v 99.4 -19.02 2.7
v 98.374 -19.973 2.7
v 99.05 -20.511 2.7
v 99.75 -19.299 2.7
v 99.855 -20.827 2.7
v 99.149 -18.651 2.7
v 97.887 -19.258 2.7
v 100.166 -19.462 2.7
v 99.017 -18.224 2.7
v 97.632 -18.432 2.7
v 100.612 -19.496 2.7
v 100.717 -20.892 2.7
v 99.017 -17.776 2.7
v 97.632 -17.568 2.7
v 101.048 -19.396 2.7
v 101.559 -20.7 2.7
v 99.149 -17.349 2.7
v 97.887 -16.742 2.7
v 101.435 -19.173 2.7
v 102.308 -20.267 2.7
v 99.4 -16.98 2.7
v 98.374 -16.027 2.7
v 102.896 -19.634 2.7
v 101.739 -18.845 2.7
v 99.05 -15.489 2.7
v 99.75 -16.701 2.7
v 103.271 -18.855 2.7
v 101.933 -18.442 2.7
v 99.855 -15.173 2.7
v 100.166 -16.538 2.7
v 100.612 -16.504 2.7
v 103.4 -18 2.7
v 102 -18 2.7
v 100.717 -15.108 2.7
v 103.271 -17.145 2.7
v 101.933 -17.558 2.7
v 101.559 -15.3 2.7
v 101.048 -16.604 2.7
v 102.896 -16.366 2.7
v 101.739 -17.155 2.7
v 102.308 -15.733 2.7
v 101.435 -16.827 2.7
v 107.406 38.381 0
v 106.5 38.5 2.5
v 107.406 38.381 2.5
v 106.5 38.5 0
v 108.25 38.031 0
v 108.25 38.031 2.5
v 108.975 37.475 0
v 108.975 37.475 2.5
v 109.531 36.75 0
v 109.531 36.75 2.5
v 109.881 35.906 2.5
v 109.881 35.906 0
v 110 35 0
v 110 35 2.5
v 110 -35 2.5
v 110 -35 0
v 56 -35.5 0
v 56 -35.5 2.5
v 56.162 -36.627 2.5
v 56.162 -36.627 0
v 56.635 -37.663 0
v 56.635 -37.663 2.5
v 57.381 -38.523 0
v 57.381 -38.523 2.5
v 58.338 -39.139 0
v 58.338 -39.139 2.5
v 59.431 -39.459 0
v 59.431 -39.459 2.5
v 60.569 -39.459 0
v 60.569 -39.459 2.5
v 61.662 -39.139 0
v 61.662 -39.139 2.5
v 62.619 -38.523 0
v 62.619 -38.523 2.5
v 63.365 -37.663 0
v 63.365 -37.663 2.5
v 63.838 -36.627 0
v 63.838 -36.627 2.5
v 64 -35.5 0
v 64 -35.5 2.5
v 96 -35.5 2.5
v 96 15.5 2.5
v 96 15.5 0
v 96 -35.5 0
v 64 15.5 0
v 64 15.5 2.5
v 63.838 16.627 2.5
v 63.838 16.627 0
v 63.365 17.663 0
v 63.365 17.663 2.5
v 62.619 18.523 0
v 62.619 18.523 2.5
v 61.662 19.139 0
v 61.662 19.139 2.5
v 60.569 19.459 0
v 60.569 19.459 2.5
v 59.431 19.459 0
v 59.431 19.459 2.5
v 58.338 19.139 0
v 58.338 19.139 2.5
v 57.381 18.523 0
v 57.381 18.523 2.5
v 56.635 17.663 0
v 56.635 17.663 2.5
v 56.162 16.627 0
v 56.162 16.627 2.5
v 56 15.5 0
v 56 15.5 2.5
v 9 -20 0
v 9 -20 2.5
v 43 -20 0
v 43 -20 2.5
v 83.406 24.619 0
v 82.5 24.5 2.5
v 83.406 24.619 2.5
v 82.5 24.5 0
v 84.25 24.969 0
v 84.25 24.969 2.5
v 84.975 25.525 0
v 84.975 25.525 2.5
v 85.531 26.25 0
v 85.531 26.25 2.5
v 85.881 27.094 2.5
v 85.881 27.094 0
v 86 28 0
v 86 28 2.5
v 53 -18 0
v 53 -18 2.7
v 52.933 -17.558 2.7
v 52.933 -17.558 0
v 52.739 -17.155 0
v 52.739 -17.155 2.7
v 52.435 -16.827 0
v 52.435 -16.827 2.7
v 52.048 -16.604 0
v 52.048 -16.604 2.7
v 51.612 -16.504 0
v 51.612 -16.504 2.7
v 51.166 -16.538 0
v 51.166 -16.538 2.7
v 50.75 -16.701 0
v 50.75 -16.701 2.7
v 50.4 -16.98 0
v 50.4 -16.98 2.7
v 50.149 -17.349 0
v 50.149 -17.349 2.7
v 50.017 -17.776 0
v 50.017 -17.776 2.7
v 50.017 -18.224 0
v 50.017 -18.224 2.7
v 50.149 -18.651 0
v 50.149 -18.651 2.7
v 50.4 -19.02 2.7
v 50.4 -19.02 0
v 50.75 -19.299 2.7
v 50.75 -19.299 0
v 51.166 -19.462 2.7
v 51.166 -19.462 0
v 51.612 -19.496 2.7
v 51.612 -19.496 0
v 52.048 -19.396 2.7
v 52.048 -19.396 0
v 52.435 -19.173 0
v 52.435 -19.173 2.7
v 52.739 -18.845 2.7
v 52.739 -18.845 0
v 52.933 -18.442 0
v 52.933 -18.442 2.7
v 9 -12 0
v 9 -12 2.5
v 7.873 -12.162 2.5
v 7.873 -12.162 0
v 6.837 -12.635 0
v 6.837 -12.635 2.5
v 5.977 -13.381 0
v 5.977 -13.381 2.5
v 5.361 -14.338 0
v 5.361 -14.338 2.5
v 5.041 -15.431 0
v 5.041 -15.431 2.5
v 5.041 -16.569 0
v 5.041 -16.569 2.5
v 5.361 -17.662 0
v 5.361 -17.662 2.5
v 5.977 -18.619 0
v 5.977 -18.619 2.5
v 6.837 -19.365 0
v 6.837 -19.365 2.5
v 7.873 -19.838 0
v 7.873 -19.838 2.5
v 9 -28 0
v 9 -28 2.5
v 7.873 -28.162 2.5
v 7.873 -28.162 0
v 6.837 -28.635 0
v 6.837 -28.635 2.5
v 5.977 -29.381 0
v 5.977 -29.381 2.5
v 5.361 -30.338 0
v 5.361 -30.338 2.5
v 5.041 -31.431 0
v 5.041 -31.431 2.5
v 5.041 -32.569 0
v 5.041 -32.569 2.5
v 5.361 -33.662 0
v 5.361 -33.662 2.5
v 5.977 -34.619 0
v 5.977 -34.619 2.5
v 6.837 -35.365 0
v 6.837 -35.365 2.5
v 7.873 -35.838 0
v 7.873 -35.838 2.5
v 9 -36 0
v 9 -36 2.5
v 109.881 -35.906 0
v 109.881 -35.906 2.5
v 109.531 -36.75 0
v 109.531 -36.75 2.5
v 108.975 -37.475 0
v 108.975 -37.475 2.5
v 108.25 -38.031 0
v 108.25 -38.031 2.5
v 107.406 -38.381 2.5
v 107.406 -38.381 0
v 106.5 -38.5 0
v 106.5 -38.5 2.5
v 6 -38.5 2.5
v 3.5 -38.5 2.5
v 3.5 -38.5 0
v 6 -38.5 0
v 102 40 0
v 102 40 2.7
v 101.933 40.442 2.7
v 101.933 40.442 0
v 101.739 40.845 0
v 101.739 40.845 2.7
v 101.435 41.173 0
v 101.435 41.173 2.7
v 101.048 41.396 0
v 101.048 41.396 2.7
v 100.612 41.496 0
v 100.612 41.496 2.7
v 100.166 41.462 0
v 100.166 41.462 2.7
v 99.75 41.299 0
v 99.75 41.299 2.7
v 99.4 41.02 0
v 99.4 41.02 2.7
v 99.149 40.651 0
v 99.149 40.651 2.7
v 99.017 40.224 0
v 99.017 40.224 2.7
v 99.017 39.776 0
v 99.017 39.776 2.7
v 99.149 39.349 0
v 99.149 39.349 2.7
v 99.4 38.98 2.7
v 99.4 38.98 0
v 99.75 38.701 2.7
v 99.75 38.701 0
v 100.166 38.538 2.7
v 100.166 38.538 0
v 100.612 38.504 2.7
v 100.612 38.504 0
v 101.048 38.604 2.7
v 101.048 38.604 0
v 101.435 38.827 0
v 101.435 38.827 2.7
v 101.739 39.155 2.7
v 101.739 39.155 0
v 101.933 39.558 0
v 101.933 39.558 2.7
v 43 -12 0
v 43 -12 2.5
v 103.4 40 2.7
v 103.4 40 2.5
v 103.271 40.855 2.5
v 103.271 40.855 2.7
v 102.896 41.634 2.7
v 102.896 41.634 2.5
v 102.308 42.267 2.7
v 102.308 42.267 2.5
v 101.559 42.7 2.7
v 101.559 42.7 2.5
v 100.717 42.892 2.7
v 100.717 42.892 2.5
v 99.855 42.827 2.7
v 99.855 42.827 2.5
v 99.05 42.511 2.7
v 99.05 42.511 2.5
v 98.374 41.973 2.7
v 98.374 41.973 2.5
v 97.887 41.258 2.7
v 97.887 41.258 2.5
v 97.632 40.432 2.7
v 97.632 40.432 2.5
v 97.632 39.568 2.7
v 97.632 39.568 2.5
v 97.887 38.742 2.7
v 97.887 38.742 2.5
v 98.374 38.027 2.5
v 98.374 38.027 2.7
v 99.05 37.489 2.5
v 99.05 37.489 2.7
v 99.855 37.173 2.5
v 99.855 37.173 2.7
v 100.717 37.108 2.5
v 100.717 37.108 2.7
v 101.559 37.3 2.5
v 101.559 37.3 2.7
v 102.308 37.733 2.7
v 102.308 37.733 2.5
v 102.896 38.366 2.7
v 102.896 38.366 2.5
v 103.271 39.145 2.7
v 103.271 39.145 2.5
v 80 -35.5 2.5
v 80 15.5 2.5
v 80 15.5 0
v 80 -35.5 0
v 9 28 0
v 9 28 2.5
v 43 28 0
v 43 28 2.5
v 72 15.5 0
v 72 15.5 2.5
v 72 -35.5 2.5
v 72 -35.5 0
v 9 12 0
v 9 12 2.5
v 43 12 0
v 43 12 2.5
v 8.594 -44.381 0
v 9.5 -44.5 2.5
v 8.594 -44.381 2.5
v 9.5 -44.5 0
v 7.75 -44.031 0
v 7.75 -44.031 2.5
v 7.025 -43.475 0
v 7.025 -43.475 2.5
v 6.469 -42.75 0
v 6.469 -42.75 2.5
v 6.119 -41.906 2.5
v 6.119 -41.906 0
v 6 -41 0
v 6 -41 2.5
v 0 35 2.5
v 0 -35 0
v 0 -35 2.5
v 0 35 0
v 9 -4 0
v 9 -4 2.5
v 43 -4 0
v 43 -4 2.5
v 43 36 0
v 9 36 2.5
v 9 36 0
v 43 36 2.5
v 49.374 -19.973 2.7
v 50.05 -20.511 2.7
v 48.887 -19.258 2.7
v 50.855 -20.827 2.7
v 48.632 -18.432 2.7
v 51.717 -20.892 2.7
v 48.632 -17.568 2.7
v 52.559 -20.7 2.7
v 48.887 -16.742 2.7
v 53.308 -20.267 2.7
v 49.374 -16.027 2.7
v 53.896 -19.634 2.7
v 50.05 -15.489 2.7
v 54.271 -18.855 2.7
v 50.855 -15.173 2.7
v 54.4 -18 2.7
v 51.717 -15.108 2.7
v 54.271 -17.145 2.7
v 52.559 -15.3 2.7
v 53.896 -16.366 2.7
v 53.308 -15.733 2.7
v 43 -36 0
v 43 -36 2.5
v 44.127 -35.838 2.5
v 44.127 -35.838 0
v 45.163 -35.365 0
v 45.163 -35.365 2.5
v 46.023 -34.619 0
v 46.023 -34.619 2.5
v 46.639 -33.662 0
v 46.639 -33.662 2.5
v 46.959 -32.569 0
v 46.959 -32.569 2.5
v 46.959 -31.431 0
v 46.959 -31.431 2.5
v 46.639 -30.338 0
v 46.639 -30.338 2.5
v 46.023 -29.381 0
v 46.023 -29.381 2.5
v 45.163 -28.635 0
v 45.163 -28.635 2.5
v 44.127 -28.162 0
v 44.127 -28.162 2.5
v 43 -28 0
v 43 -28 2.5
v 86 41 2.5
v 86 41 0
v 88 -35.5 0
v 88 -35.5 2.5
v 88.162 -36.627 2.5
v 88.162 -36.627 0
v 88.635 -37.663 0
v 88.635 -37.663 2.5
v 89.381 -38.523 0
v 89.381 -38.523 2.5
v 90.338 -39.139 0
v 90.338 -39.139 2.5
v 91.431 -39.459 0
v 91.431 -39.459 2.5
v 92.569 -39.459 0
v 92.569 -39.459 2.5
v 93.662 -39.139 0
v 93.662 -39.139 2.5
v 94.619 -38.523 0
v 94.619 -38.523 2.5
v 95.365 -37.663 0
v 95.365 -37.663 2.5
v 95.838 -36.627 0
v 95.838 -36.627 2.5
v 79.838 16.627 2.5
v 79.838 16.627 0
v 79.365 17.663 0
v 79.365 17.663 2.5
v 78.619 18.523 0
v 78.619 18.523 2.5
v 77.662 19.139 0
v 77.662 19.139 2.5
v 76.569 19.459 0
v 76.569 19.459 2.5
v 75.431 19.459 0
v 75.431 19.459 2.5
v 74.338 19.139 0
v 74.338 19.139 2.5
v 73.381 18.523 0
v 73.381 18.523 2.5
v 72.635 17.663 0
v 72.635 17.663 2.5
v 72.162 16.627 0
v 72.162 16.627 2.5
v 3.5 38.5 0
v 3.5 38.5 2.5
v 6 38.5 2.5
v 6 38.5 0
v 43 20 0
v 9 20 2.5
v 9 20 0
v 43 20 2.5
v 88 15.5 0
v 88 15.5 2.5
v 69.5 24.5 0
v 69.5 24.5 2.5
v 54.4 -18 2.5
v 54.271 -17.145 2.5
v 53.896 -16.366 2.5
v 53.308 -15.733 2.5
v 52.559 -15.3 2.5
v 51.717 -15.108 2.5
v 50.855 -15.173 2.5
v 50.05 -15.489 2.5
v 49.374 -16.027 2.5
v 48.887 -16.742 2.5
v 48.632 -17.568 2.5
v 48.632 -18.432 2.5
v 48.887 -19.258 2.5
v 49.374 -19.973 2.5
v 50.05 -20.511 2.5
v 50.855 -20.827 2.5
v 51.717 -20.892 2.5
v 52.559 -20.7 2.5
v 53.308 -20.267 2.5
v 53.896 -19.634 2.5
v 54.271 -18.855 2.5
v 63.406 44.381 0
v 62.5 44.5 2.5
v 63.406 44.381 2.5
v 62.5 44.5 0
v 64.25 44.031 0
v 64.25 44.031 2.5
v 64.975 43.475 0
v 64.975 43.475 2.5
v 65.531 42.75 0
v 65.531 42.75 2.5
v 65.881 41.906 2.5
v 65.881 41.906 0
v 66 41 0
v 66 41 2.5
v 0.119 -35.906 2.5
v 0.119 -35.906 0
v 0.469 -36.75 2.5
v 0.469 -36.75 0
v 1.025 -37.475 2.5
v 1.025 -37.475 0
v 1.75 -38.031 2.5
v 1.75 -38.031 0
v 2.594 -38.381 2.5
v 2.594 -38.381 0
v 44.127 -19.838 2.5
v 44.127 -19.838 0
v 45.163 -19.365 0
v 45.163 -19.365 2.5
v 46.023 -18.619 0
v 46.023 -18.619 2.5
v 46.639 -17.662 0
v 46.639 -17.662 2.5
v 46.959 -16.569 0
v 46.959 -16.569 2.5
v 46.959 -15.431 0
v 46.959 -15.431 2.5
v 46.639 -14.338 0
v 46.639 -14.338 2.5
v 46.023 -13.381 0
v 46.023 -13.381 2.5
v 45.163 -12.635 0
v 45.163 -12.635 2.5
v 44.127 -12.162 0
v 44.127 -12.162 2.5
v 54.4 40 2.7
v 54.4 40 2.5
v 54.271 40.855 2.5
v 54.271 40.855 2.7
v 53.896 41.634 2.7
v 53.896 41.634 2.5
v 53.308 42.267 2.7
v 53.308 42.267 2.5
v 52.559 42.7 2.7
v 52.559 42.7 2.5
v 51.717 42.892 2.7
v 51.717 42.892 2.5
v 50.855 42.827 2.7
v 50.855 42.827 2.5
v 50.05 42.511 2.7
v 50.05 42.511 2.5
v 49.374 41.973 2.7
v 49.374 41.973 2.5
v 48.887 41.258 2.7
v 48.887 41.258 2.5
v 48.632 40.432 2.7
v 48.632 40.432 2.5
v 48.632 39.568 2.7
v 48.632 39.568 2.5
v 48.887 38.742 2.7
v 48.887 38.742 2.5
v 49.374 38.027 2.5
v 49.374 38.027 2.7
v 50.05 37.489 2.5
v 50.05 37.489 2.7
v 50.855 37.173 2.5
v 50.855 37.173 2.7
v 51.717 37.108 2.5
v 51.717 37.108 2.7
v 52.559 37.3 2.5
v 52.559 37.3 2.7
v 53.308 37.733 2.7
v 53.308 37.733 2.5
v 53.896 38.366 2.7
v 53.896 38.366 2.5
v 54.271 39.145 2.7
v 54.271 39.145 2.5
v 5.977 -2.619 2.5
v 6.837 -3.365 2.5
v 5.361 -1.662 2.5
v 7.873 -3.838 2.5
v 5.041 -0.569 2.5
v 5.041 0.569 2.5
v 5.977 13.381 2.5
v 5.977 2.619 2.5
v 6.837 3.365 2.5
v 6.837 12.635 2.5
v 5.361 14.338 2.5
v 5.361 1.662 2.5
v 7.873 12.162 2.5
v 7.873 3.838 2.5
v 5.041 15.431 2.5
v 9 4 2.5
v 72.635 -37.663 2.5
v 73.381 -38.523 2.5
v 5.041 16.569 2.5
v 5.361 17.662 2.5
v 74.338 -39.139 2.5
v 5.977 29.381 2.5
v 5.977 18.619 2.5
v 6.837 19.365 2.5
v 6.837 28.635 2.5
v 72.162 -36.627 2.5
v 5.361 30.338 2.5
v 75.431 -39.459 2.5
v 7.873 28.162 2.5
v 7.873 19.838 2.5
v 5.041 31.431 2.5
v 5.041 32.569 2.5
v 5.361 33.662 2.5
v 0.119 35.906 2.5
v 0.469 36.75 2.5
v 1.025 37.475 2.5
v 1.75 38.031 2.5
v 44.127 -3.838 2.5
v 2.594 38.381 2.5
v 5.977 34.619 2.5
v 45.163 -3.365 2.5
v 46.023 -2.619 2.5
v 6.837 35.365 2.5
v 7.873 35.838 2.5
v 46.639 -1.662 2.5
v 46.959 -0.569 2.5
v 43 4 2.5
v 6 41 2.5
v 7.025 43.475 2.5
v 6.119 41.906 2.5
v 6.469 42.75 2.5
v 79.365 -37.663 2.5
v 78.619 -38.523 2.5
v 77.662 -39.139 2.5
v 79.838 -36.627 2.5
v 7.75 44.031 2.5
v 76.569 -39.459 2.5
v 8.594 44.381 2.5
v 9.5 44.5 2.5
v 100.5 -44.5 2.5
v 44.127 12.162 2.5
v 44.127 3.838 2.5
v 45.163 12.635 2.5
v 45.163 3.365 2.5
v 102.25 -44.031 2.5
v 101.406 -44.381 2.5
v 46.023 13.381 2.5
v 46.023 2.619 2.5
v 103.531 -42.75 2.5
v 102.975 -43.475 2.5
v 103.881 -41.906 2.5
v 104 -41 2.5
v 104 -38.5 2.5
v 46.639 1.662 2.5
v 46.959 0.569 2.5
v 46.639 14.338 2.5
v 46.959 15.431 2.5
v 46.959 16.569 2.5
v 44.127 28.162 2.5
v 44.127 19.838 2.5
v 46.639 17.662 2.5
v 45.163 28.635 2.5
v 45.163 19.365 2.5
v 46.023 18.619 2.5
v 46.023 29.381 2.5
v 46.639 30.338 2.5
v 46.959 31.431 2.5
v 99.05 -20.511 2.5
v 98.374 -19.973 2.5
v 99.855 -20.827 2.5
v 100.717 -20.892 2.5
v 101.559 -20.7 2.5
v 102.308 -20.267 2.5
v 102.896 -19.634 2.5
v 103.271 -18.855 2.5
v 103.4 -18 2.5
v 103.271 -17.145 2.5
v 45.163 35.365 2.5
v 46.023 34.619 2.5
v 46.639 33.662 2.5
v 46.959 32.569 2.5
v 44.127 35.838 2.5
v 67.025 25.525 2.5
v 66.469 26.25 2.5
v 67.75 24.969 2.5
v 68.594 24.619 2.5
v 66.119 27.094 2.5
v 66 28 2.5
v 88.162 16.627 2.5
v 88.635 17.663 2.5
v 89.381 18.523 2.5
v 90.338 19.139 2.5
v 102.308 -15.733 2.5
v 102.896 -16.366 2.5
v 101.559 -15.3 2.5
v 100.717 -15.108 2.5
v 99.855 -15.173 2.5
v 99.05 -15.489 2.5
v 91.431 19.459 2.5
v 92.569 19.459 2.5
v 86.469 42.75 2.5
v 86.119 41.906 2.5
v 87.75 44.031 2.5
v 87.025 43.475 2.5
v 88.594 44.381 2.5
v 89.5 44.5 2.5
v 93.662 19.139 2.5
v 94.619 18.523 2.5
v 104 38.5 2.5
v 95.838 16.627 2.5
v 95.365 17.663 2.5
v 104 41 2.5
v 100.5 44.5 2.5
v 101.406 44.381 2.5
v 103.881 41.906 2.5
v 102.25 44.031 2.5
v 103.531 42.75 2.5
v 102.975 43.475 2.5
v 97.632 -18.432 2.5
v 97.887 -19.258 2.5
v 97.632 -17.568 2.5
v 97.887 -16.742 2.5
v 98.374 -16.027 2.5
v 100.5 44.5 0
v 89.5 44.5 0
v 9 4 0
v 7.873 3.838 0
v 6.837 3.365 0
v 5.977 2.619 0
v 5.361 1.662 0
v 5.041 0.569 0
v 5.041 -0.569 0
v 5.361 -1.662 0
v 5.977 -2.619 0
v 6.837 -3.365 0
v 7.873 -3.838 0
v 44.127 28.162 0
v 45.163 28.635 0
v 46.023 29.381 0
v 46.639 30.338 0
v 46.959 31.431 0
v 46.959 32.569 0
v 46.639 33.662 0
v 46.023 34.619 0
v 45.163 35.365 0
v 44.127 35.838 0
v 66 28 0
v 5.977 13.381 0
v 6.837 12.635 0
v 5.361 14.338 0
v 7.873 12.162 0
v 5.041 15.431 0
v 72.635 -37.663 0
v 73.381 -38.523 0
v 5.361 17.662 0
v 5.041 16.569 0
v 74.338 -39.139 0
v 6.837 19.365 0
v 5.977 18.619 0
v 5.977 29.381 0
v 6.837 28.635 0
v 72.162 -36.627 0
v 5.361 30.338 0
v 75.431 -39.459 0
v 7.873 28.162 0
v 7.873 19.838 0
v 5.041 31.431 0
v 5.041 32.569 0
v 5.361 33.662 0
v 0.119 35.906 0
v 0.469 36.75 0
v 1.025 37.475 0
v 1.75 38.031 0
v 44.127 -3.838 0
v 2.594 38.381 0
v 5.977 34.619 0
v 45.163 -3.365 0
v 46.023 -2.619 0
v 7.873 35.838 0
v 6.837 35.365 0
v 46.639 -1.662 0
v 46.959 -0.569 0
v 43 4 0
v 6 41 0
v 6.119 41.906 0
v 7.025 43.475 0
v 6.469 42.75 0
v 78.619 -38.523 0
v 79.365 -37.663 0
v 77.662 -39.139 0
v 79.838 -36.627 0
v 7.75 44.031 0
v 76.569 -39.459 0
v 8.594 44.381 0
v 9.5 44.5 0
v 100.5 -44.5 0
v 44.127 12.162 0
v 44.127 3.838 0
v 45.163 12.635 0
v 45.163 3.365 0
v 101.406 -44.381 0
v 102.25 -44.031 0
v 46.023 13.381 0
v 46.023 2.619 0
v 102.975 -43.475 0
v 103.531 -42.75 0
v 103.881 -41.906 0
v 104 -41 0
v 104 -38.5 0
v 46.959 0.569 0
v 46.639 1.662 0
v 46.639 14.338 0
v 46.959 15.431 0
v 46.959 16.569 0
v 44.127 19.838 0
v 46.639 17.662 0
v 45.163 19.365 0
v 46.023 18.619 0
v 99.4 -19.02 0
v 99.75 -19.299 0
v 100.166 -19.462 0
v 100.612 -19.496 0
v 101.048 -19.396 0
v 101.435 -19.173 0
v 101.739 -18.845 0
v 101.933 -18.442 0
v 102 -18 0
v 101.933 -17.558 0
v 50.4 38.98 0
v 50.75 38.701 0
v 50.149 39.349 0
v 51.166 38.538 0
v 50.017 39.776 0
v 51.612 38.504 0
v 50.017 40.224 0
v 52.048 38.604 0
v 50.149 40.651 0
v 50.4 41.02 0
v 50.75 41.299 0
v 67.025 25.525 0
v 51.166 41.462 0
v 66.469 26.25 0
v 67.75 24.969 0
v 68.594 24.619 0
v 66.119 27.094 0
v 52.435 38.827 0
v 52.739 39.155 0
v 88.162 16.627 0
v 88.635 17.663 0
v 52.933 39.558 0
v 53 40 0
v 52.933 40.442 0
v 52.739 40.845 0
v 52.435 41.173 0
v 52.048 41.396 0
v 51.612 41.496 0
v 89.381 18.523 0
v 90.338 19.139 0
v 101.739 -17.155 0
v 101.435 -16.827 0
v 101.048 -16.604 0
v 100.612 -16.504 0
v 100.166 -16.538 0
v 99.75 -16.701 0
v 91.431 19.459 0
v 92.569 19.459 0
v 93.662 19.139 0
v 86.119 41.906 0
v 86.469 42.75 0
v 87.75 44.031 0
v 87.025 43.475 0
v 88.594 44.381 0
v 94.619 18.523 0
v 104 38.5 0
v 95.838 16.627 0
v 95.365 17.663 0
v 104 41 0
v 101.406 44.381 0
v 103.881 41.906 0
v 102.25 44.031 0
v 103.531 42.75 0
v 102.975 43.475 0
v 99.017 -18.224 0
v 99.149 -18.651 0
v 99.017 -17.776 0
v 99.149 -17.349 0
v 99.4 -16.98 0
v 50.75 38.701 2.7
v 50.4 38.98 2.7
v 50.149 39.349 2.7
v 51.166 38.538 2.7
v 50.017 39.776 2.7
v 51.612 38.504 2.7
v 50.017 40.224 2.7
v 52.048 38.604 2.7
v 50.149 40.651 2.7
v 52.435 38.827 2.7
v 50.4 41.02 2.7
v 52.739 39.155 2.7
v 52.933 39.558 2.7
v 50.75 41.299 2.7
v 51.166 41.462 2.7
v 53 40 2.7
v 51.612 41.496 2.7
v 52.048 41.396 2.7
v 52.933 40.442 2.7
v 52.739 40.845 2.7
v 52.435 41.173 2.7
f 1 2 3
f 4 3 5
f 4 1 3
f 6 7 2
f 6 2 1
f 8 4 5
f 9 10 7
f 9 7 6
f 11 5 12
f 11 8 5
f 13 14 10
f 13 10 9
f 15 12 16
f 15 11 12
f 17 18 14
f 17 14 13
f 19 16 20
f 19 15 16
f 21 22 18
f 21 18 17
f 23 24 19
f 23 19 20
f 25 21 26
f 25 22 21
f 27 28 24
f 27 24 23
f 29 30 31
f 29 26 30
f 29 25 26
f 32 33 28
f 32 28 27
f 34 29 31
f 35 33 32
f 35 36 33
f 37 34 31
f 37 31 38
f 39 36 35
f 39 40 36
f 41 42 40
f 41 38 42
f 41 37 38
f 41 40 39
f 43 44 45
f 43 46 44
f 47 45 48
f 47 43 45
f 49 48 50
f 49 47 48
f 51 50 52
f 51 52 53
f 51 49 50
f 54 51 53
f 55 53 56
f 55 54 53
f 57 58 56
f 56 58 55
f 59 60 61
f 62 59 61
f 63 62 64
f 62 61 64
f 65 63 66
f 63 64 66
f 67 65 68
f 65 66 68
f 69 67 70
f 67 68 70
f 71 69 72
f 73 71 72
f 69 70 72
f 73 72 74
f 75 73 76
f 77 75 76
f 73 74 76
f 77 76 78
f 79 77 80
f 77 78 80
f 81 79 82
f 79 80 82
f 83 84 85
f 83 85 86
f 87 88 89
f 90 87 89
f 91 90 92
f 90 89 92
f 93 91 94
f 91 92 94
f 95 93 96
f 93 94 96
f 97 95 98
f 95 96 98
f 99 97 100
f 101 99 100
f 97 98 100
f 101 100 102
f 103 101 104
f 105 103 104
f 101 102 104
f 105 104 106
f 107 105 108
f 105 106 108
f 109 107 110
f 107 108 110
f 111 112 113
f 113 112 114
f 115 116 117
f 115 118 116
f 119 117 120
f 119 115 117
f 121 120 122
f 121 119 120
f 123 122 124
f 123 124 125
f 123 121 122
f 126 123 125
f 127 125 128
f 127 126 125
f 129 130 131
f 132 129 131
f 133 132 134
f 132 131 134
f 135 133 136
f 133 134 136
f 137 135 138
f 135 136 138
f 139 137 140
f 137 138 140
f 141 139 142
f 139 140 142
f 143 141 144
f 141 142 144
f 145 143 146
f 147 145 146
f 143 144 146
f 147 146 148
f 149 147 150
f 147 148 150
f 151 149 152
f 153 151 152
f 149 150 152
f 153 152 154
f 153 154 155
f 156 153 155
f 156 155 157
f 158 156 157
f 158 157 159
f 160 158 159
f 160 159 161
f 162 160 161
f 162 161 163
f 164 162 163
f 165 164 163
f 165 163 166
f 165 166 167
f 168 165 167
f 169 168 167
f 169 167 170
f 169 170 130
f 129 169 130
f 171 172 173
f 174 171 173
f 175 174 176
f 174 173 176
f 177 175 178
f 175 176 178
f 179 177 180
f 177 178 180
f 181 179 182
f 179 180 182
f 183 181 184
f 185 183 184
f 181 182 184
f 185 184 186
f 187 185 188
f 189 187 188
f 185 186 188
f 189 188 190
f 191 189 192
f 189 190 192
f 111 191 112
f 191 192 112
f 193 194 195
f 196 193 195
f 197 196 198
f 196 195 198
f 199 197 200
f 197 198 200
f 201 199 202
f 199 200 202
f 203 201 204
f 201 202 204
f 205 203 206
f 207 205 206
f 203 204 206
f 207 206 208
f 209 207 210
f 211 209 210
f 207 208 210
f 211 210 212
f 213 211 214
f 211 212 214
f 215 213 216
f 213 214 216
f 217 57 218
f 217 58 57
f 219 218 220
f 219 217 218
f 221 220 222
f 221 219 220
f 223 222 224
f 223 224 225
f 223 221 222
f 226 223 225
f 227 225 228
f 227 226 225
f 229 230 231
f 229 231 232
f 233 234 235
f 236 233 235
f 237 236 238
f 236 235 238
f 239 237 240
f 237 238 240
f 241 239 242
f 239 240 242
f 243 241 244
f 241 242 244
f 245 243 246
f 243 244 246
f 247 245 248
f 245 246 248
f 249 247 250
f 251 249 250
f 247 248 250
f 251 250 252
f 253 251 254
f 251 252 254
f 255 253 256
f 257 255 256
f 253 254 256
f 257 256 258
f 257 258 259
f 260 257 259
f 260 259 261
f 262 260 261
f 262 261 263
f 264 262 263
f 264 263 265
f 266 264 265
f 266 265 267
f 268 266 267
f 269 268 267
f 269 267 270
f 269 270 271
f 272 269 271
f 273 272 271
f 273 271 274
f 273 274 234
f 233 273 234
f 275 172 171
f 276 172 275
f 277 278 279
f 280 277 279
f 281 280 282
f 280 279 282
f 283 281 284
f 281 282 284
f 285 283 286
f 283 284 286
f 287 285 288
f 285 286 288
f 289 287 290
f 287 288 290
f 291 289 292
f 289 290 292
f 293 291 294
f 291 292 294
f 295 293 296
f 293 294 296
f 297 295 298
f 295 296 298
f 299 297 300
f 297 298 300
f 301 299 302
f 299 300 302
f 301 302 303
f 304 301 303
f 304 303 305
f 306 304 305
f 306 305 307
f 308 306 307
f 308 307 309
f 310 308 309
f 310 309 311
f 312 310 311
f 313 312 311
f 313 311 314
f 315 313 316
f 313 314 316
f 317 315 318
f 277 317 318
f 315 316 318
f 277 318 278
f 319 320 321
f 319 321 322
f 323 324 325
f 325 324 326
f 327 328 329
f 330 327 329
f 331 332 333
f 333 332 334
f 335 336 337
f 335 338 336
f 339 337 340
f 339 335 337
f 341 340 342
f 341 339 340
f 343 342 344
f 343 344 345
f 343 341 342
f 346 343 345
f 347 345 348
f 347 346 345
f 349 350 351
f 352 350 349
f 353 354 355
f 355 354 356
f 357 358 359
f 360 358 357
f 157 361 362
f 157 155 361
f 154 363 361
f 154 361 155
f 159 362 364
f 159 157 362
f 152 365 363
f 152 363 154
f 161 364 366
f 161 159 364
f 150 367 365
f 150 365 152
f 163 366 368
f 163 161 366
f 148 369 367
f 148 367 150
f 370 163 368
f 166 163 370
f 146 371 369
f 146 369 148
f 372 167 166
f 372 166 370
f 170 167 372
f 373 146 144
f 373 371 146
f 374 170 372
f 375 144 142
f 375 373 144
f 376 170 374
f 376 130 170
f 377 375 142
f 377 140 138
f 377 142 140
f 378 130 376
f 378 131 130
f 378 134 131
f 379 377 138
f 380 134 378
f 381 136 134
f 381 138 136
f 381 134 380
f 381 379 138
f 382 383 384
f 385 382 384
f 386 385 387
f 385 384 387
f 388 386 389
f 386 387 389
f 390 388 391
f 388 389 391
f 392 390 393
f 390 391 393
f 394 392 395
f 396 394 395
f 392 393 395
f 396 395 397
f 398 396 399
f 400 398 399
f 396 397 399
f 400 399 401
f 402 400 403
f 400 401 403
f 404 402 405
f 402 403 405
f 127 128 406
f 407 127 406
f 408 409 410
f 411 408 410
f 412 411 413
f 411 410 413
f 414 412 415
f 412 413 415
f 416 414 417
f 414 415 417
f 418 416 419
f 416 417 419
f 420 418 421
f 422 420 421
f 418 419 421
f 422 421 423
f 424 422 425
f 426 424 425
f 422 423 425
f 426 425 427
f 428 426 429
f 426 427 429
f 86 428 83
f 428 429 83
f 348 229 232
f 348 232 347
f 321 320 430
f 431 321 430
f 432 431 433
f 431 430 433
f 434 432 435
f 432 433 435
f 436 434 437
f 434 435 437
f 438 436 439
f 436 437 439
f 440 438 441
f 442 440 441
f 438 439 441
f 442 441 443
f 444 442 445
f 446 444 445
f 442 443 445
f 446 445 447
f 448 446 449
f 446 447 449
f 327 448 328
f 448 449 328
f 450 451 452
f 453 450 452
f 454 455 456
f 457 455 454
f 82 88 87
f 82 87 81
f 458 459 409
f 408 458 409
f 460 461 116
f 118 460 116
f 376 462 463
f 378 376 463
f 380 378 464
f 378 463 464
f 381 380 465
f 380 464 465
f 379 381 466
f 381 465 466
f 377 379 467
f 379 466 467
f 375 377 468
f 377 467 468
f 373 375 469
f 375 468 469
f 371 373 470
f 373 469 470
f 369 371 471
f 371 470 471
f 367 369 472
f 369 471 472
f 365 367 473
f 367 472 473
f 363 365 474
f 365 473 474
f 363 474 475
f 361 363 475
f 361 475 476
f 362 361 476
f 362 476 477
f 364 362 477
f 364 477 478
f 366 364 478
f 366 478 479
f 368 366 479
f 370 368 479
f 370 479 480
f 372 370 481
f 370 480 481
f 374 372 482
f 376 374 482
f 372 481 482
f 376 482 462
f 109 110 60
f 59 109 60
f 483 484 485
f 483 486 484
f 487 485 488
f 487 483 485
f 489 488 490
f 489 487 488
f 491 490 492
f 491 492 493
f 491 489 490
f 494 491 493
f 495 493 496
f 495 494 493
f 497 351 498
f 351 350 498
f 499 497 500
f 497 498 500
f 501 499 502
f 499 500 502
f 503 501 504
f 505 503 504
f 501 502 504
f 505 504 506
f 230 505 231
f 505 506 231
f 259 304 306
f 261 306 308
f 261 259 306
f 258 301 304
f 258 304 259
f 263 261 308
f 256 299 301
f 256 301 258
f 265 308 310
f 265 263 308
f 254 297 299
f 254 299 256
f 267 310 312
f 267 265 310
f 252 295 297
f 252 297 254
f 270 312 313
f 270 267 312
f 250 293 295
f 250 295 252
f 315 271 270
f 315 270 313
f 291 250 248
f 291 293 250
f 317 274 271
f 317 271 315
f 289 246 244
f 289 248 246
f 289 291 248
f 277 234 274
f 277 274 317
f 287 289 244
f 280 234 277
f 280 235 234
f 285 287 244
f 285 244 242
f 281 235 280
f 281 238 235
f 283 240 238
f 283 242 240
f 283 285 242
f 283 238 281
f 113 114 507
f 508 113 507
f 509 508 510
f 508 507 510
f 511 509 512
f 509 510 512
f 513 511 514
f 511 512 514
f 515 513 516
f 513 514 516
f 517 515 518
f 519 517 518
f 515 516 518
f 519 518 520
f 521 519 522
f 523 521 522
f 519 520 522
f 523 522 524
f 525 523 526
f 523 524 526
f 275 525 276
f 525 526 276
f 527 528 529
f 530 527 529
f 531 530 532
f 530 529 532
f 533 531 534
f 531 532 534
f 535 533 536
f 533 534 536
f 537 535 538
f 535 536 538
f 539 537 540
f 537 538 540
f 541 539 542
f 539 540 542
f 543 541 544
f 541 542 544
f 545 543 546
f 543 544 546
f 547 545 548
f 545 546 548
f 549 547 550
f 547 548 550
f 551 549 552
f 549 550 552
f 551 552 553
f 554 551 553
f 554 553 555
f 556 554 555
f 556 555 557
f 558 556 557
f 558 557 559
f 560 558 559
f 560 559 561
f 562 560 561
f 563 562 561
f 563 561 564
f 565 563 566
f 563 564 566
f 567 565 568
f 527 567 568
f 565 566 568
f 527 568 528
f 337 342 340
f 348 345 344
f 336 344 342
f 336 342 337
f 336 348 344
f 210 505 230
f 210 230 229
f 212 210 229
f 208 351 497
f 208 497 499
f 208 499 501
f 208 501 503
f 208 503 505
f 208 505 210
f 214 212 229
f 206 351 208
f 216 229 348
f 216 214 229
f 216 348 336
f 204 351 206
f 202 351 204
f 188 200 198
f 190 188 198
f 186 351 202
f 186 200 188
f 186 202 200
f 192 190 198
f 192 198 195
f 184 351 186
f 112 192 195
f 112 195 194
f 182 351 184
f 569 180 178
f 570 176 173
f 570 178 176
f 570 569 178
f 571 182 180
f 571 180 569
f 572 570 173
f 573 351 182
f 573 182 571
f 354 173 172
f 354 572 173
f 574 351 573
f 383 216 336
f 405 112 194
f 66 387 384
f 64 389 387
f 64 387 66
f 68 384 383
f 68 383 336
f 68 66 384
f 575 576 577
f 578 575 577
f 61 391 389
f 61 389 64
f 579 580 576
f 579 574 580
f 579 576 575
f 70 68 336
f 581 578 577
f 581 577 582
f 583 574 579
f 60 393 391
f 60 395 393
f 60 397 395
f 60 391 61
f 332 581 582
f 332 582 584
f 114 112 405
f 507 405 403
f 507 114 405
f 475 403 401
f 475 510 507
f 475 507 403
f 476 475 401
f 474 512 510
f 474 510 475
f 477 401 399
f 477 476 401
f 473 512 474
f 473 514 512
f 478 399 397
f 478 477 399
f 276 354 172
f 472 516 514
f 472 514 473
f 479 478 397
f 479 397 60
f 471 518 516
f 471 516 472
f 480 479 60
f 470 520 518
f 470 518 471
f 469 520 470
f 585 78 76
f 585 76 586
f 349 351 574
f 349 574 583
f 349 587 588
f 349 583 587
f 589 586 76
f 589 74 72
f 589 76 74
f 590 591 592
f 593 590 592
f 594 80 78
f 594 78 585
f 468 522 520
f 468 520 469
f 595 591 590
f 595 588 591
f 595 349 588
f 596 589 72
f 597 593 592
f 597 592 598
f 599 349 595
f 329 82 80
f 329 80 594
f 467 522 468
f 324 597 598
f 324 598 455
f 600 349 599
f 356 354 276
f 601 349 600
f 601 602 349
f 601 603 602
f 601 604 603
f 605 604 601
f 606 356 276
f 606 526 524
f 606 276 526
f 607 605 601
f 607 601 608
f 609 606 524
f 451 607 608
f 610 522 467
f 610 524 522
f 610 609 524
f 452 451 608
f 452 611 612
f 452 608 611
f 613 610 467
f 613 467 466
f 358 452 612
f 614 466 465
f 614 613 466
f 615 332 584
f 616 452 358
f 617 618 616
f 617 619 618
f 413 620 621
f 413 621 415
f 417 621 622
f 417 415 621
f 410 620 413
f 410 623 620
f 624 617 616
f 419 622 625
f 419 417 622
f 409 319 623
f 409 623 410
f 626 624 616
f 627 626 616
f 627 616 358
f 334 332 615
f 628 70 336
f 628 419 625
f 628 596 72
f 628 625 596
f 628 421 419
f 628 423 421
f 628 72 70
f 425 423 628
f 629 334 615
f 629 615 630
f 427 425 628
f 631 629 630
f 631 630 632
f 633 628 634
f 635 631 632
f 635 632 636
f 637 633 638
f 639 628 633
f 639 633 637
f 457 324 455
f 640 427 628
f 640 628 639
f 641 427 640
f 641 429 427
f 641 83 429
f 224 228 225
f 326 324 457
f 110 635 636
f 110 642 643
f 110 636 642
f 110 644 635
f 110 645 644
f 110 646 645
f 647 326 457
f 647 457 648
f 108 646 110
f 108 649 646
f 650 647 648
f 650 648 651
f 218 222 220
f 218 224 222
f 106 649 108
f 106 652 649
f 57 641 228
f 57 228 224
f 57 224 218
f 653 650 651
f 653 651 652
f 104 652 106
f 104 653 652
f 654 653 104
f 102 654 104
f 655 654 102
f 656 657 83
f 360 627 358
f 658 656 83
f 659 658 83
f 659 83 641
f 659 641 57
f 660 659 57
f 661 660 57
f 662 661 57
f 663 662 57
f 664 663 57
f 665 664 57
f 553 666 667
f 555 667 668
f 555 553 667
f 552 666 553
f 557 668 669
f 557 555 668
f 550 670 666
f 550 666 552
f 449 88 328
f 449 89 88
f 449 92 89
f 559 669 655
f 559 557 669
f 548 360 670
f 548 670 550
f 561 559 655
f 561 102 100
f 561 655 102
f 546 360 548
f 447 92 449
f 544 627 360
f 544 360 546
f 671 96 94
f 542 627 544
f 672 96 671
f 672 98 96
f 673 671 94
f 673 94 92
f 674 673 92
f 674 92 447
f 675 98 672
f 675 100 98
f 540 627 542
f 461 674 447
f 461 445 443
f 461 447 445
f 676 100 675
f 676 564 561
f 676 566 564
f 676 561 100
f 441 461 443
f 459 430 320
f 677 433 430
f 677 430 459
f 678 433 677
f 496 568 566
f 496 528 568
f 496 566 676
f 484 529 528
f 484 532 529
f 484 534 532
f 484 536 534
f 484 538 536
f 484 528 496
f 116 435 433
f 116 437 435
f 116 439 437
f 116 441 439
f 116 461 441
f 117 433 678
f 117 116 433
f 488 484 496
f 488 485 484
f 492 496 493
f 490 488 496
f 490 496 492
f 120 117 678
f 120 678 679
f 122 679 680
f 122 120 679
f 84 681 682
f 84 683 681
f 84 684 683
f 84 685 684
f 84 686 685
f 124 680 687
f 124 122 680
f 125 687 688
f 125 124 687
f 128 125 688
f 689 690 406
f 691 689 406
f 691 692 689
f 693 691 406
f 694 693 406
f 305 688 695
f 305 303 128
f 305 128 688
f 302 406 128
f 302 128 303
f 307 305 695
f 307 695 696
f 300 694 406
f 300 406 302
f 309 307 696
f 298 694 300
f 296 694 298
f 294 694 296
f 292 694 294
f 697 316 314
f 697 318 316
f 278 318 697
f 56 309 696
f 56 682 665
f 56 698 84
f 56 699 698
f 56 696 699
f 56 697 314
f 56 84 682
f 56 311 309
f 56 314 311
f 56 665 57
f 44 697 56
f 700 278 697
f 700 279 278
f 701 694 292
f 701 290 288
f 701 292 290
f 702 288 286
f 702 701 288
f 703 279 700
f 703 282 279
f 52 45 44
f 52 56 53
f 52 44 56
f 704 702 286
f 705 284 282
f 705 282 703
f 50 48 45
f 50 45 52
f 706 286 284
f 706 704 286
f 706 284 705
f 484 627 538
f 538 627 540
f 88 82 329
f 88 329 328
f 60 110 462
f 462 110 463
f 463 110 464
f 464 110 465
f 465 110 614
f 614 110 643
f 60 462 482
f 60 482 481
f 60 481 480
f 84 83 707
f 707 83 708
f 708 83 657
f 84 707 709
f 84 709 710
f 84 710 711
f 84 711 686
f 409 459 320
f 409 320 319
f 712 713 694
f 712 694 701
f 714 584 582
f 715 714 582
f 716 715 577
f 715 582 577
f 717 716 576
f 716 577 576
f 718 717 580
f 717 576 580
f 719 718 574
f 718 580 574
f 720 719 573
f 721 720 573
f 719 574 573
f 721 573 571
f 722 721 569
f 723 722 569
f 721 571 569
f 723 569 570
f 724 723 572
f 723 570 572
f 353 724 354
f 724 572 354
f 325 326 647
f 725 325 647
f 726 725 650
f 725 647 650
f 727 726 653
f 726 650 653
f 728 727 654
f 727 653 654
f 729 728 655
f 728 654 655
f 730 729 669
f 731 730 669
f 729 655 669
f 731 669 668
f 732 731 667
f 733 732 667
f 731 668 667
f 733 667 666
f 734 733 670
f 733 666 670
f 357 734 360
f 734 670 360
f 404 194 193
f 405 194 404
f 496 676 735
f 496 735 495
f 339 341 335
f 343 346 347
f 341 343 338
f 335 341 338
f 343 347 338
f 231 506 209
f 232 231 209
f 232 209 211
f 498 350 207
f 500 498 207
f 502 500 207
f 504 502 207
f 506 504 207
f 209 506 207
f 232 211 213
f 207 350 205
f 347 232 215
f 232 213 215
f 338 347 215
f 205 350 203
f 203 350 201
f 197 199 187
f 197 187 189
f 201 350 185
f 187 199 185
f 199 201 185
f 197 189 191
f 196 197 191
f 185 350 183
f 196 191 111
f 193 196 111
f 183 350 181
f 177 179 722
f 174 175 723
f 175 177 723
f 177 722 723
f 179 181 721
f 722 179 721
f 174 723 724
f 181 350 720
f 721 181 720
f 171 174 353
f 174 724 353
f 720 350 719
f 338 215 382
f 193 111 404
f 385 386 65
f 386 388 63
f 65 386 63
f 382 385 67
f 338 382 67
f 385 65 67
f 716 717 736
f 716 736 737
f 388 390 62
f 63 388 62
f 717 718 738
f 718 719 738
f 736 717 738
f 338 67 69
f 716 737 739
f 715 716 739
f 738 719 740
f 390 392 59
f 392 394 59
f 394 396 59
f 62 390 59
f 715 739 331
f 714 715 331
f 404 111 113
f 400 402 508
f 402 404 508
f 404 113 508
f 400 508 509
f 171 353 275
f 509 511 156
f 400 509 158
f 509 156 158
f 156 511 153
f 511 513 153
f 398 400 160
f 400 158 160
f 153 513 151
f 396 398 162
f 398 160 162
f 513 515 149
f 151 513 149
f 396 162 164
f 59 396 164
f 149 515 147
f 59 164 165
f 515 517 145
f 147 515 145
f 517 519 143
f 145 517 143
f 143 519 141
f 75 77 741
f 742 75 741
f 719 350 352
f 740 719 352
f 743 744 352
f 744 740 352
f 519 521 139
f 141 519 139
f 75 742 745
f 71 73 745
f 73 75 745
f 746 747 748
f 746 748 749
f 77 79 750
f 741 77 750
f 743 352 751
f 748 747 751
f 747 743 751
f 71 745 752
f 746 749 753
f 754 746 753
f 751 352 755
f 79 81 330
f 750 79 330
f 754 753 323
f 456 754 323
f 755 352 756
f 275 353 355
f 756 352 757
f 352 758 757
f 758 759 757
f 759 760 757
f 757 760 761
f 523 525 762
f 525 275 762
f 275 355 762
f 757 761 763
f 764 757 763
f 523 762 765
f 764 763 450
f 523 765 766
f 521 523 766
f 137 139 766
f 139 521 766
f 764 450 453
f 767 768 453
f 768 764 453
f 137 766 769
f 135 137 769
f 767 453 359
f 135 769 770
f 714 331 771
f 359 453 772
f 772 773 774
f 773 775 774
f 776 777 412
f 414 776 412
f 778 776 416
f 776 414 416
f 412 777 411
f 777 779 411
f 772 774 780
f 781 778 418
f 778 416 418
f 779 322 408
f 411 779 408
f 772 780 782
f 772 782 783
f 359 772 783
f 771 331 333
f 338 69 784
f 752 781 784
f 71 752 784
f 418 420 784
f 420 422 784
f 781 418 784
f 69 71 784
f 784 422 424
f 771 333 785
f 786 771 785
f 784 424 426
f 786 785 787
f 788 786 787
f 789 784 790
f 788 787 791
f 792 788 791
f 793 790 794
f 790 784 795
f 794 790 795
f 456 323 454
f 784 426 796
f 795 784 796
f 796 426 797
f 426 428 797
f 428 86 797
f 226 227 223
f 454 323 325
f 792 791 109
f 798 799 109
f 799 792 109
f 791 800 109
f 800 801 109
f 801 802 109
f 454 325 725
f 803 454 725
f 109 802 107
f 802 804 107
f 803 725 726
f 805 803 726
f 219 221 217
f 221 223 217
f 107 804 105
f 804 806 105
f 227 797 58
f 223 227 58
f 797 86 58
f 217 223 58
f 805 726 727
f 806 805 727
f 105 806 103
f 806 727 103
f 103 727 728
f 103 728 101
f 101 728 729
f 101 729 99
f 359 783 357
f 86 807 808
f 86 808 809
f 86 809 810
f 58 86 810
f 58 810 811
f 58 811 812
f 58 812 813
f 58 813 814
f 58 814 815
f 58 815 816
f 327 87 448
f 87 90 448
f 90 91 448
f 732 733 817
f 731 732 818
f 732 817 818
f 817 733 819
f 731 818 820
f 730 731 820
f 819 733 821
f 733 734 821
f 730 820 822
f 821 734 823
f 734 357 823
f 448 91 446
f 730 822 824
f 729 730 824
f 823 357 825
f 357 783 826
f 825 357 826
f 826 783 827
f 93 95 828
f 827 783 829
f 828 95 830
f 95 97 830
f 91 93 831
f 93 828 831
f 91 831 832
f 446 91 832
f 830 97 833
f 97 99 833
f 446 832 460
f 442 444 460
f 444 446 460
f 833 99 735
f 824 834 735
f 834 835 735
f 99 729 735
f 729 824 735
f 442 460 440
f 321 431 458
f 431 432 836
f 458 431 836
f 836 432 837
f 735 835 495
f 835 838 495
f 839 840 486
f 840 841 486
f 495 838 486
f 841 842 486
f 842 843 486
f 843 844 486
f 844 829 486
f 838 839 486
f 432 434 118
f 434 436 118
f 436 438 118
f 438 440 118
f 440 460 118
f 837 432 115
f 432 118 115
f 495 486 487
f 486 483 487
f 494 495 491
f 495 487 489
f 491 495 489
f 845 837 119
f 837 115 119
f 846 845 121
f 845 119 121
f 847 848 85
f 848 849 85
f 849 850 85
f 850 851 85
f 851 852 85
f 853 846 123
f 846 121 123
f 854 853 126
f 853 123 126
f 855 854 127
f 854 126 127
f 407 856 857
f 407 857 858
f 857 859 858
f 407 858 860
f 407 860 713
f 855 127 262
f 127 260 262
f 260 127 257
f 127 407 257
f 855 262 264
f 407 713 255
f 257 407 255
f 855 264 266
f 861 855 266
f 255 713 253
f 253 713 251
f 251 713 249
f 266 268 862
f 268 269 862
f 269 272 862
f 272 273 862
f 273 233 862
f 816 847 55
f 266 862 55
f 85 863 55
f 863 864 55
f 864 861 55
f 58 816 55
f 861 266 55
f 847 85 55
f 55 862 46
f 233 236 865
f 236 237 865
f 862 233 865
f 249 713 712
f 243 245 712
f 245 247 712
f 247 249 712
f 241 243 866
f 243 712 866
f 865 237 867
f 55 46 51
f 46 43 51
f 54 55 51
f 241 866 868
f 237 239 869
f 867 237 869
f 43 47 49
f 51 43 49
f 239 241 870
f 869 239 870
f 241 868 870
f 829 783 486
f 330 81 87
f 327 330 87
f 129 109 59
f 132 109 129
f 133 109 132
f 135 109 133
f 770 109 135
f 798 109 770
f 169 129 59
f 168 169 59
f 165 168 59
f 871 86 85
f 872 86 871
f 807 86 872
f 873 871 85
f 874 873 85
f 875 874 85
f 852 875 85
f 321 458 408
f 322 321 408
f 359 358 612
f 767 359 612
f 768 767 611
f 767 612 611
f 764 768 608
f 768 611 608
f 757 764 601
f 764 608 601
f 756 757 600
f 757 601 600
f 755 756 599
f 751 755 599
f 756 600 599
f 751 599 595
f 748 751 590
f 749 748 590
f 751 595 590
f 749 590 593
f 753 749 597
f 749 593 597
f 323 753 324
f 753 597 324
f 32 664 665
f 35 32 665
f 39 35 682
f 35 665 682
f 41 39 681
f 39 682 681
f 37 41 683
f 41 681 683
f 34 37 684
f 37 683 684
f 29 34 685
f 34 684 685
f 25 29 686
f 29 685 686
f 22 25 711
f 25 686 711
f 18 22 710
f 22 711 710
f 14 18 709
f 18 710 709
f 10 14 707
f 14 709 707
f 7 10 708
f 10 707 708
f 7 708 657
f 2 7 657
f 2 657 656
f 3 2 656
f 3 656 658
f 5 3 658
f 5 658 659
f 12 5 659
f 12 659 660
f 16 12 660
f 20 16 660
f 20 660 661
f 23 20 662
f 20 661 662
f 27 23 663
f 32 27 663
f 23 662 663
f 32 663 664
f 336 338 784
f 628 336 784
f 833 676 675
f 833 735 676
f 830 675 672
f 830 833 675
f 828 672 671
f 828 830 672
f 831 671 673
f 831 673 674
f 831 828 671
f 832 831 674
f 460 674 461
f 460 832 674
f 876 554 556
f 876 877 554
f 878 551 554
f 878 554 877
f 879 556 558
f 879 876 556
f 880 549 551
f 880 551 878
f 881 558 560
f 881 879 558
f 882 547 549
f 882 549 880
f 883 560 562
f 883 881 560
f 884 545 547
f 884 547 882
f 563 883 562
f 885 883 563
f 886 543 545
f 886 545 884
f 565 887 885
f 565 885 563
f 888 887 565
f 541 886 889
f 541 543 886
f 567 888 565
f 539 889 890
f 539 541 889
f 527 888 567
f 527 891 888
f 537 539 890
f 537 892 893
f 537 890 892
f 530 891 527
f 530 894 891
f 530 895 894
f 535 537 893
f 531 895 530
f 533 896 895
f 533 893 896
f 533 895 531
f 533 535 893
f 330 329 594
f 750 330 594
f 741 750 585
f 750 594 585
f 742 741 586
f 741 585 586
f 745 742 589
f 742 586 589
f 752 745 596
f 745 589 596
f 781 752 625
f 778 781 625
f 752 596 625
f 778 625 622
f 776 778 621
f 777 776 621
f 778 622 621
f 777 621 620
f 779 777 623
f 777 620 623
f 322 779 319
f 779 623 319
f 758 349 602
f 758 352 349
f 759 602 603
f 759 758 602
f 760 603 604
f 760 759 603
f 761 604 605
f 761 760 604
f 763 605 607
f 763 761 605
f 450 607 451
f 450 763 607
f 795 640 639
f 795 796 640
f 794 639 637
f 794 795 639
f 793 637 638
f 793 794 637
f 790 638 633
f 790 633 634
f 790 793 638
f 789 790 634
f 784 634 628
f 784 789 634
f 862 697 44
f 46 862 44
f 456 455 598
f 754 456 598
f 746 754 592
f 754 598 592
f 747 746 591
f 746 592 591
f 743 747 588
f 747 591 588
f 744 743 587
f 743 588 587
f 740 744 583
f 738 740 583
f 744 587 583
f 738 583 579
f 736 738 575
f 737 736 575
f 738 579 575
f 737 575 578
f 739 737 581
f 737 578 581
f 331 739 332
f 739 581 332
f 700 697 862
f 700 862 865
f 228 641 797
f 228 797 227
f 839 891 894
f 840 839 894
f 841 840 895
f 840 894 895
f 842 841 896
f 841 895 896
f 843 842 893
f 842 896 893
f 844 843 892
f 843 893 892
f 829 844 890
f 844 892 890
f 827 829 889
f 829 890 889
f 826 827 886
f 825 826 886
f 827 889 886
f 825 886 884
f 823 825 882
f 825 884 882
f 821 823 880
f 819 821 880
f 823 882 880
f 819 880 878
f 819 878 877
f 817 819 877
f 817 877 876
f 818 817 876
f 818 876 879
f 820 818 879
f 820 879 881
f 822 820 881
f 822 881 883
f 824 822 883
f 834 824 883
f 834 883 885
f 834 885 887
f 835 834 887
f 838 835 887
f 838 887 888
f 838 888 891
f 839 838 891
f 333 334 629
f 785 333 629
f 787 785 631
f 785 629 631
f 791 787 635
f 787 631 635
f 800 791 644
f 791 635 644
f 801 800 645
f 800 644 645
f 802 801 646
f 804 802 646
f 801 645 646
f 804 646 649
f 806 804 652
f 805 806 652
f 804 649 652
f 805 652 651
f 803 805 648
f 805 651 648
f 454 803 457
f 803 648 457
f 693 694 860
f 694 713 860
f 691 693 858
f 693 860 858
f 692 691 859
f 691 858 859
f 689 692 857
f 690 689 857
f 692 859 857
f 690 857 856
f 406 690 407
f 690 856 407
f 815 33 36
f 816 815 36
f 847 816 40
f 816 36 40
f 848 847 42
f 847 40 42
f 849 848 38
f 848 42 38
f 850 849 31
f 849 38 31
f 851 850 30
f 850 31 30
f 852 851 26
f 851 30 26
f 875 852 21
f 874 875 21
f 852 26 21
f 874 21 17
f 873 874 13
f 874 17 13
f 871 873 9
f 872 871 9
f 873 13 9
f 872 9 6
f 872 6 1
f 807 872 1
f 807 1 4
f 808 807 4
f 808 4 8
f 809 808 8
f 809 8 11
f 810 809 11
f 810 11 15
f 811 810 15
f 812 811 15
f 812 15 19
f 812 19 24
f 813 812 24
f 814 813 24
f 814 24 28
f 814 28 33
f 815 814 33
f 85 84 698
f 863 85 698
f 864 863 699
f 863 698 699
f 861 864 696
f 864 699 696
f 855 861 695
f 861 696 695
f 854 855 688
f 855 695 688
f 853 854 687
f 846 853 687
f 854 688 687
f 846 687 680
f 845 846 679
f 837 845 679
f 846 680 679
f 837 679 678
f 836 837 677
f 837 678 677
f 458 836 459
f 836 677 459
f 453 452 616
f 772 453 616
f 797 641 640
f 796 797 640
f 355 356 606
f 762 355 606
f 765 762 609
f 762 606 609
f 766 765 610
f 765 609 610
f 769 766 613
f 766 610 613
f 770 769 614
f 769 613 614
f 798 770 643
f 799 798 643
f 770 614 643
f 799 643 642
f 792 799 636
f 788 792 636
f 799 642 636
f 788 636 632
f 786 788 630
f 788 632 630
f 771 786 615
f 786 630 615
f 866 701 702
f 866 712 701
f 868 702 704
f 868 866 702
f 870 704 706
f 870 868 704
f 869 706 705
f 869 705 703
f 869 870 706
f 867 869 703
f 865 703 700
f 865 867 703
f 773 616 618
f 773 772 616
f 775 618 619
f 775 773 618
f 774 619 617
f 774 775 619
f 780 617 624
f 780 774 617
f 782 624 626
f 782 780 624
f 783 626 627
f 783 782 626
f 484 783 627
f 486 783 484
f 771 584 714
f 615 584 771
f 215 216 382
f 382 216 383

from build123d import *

# Parameters (mm, degrees)
SKETCH_W                           = 110
SKETCH_H                           = 89
PAD_DEPTH                          = 2.5
SKETCH001_R                        = 2.9
PAD001_DEPTH                       = 0.2
SKETCH002_R                        = 1.5
POCKET_DEPTH                       = 2.701
SKETCH003_W                        = 20
SKETCH003_H                        = 20
POCKET001_DEPTH                    = 2.501
POCKET002_DEPTH                    = 285.543682
POCKET002_LINEARPATTERN_2_DEPTH    = 285.543682
LINEARPATTERN001_COUNT             = 2
LINEARPATTERN001_PITCH             = 16
POCKET003_DEPTH                    = 285.543682
POCKET003_LINEARPATTERN002_2_DEPTH = 285.543682
POCKET003_LINEARPATTERN002_3_DEPTH = 285.543682
LINEARPATTERN003_COUNT             = 3
LINEARPATTERN003_PITCH             = 16
FILLET_R                           = 3.5
SKETCH006_W                        = 6
SKETCH006_H                        = 6
POCKET004_DEPTH                    = 285.543682
FILLET001_R                        = 3.5


with BuildPart() as part:
    # Sketch → Pad (new body)
    with BuildSketch(Plane.XY):
        with Locations((55, 0)):
            Rectangle(SKETCH_W, SKETCH_H)
    extrude(amount=PAD_DEPTH)

    # Sketch001 (on Face6 of Pad) → Pad001 (join)
    with BuildSketch(Plane.XY.offset(2.5)):
        with Locations((100.5, 40)):
            Circle(SKETCH001_R)
        with Locations((100.5, -18)):
            Circle(SKETCH001_R)
        with Locations((51.5, 40)):
            Circle(SKETCH001_R)
        with Locations((51.5, -18)):
            Circle(SKETCH001_R)
    extrude(amount=PAD001_DEPTH)

    # Sketch002 (on Face13 of Pad001) → Pocket (cut, through all)
    with BuildSketch(Plane.XY.offset(2.7)):
        with Locations((51.5, 40)):
            Circle(SKETCH002_R)
        with Locations((100.5, 40)):
            Circle(SKETCH002_R)
        with Locations((51.5, -18)):
            Circle(SKETCH002_R)
        with Locations((100.5, -18)):
            Circle(SKETCH002_R)
    extrude(amount=-POCKET_DEPTH, mode=Mode.SUBTRACT)

    # Sketch003 → Pocket001 (cut, through all)
    with BuildSketch(Plane.XY.offset(2.5)):
        with Locations((76, 34.5)):
            Rectangle(SKETCH003_W, SKETCH003_H)
    extrude(amount=-POCKET001_DEPTH, mode=Mode.SUBTRACT)

    # Sketch004 (on Face5 of Pocket001) → Pocket002 (cut, through all)
    with BuildSketch(Plane.XY.offset(2.5)):
        with BuildLine():
            ThreePointArc((80, 15.5), (76, 19.5), (72, 15.5))
            Line((72, 15.5), (72, -35.5))
            ThreePointArc((72, -35.5), (76, -39.5), (80, -35.5))
            Line((80, 15.5), (80, -35.5))
        make_face()
    pocket002 = extrude(amount=-POCKET002_DEPTH, mode=Mode.SUBTRACT)

    # Sketch004 LinearPattern 2 → Pocket002 LinearPattern 2 (cut, through all)
    with BuildSketch(Plane(origin=(16, 0, 2.5), x_dir=(1, 0, 0), z_dir=(0, 0, 1))):
        with BuildLine():
            ThreePointArc((80, 15.5), (76, 19.5), (72, 15.5))
            Line((72, 15.5), (72, -35.5))
            ThreePointArc((72, -35.5), (76, -39.5), (80, -35.5))
            Line((80, 15.5), (80, -35.5))
        make_face()
    pocket002_linearpattern_2 = extrude(amount=-POCKET002_LINEARPATTERN_2_DEPTH, mode=Mode.SUBTRACT)

    # LinearPattern001: Pocket002, Pocket002 LinearPattern 2 ×2
    with Locations(*[(-i * LINEARPATTERN001_PITCH, 0, 0) for i in range(1, LINEARPATTERN001_COUNT)]):
        add(pocket002, mode=Mode.SUBTRACT)
        add(pocket002_linearpattern_2, mode=Mode.SUBTRACT)

    # Sketch005 (on Face5 of MultiTransform) → Pocket003 (cut, through all)
    with BuildSketch(Plane.XY.offset(2.5)):
        with BuildLine():
            ThreePointArc((9, 4), (5, 0), (9, -4))
            Line((9, -4), (43, -4))
            ThreePointArc((43, -4), (47, 0), (43, 4))
            Line((9, 4), (43, 4))
        make_face()
    pocket003 = extrude(amount=-POCKET003_DEPTH, mode=Mode.SUBTRACT)

    # Sketch005 LinearPattern002 2 → Pocket003 LinearPattern002 2 (cut, through all)
    with BuildSketch(Plane(origin=(0, 16, 2.5), x_dir=(1, 0, 0), z_dir=(0, 0, 1))):
        with BuildLine():
            ThreePointArc((9, 4), (5, 0), (9, -4))
            Line((9, -4), (43, -4))
            ThreePointArc((43, -4), (47, 0), (43, 4))
            Line((9, 4), (43, 4))
        make_face()
    pocket003_linearpattern002_2 = extrude(amount=-POCKET003_LINEARPATTERN002_2_DEPTH, mode=Mode.SUBTRACT)

    # Sketch005 LinearPattern002 3 → Pocket003 LinearPattern002 3 (cut, through all)
    with BuildSketch(Plane(origin=(0, 32, 2.5), x_dir=(1, 0, 0), z_dir=(0, 0, 1))):
        with BuildLine():
            ThreePointArc((9, 4), (5, 0), (9, -4))
            Line((9, -4), (43, -4))
            ThreePointArc((43, -4), (47, 0), (43, 4))
            Line((9, 4), (43, 4))
        make_face()
    pocket003_linearpattern002_3 = extrude(amount=-POCKET003_LINEARPATTERN002_3_DEPTH, mode=Mode.SUBTRACT)

    # LinearPattern003: Pocket003, Pocket003 LinearPattern002 2, Pocket003 LinearPattern002 3 ×3
    with Locations(*[(0, -i * LINEARPATTERN003_PITCH, 0) for i in range(1, LINEARPATTERN003_COUNT)]):
        add(pocket003, mode=Mode.SUBTRACT)
        add(pocket003_linearpattern002_2, mode=Mode.SUBTRACT)
        add(pocket003_linearpattern002_3, mode=Mode.SUBTRACT)

    # Fillet
    fillet_edges = [part.edges().sort_by_distance(p)[0] for p in [
        (110, 44.5, 1.25),
        (66, 44.5, 1.25),
        (66, 24.5, 1.25),
        (110, -44.5, 1.25),
        (86, 44.5, 1.25),
        (86, 24.5, 1.25),
        (0, 44.5, 1.25),
        (0, -44.5, 1.25),
    ]]
    fillet(fillet_edges, radius=FILLET_R)

    # Sketch006 (on Face5 of Fillet) → Pocket004 (cut, through all)
    with BuildSketch(Plane.XY.offset(2.5)):
        with Locations((107, 41.5)):
            Rectangle(SKETCH006_W, SKETCH006_H)
        with Locations((3, 41.5)):
            Rectangle(SKETCH006_W, SKETCH006_H)
    pocket004 = extrude(amount=-POCKET004_DEPTH, mode=Mode.SUBTRACT)

    # Mirrored: Pocket004 across XZ
    add(pocket004.mirror(Plane.XZ), mode=Mode.SUBTRACT)

    # Fillet001
    fillet001_edges = [part.edges().sort_by_distance(p)[0] for p in [
        (110, -38.5, 1.25),
        (104, -44.5, 1.25),
        (110, 38.5, 1.25),
        (104, 44.5, 1.25),
        (6, 44.5, 1.25),
        (0, 38.5, 1.25),
        (0, -38.5, 1.25),
        (6, -44.5, 1.25),
    ]]
    fillet(fillet001_edges, radius=FILLET001_R)


solid = part.part
